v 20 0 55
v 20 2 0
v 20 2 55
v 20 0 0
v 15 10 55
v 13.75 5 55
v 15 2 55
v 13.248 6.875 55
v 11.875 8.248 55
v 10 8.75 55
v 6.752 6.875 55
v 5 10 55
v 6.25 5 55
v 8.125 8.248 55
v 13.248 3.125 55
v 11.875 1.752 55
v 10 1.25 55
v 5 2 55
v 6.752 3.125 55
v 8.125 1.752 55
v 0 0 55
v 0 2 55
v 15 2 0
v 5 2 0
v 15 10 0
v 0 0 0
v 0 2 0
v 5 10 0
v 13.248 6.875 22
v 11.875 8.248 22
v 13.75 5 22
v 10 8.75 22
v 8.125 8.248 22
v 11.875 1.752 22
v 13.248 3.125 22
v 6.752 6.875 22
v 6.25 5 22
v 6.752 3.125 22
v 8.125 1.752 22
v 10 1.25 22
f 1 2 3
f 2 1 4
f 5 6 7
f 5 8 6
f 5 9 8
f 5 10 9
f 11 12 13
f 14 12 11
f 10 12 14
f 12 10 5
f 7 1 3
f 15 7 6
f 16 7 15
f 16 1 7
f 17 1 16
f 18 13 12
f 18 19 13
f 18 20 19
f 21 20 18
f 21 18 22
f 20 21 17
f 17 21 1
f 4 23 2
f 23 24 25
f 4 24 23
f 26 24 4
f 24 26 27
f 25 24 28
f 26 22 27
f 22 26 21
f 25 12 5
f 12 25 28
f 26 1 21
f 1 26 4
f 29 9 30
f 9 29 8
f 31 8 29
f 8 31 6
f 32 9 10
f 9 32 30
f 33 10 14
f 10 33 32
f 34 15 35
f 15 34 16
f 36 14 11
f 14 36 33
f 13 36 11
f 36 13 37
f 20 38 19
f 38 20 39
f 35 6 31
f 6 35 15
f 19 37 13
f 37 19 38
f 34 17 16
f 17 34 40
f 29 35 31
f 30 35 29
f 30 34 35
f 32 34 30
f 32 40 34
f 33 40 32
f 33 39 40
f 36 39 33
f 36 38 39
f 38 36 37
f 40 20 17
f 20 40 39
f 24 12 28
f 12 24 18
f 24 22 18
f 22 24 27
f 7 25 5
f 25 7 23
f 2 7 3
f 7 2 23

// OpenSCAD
difference()
{
	cube([20,10,55]);
	translate([10,5,22]) cylinder(h=35,d=7.5);
	translate([-1,2,-1]) cube([6,10,60]);
	translate([15,2,-1]) cube([6,10,60]);
}
